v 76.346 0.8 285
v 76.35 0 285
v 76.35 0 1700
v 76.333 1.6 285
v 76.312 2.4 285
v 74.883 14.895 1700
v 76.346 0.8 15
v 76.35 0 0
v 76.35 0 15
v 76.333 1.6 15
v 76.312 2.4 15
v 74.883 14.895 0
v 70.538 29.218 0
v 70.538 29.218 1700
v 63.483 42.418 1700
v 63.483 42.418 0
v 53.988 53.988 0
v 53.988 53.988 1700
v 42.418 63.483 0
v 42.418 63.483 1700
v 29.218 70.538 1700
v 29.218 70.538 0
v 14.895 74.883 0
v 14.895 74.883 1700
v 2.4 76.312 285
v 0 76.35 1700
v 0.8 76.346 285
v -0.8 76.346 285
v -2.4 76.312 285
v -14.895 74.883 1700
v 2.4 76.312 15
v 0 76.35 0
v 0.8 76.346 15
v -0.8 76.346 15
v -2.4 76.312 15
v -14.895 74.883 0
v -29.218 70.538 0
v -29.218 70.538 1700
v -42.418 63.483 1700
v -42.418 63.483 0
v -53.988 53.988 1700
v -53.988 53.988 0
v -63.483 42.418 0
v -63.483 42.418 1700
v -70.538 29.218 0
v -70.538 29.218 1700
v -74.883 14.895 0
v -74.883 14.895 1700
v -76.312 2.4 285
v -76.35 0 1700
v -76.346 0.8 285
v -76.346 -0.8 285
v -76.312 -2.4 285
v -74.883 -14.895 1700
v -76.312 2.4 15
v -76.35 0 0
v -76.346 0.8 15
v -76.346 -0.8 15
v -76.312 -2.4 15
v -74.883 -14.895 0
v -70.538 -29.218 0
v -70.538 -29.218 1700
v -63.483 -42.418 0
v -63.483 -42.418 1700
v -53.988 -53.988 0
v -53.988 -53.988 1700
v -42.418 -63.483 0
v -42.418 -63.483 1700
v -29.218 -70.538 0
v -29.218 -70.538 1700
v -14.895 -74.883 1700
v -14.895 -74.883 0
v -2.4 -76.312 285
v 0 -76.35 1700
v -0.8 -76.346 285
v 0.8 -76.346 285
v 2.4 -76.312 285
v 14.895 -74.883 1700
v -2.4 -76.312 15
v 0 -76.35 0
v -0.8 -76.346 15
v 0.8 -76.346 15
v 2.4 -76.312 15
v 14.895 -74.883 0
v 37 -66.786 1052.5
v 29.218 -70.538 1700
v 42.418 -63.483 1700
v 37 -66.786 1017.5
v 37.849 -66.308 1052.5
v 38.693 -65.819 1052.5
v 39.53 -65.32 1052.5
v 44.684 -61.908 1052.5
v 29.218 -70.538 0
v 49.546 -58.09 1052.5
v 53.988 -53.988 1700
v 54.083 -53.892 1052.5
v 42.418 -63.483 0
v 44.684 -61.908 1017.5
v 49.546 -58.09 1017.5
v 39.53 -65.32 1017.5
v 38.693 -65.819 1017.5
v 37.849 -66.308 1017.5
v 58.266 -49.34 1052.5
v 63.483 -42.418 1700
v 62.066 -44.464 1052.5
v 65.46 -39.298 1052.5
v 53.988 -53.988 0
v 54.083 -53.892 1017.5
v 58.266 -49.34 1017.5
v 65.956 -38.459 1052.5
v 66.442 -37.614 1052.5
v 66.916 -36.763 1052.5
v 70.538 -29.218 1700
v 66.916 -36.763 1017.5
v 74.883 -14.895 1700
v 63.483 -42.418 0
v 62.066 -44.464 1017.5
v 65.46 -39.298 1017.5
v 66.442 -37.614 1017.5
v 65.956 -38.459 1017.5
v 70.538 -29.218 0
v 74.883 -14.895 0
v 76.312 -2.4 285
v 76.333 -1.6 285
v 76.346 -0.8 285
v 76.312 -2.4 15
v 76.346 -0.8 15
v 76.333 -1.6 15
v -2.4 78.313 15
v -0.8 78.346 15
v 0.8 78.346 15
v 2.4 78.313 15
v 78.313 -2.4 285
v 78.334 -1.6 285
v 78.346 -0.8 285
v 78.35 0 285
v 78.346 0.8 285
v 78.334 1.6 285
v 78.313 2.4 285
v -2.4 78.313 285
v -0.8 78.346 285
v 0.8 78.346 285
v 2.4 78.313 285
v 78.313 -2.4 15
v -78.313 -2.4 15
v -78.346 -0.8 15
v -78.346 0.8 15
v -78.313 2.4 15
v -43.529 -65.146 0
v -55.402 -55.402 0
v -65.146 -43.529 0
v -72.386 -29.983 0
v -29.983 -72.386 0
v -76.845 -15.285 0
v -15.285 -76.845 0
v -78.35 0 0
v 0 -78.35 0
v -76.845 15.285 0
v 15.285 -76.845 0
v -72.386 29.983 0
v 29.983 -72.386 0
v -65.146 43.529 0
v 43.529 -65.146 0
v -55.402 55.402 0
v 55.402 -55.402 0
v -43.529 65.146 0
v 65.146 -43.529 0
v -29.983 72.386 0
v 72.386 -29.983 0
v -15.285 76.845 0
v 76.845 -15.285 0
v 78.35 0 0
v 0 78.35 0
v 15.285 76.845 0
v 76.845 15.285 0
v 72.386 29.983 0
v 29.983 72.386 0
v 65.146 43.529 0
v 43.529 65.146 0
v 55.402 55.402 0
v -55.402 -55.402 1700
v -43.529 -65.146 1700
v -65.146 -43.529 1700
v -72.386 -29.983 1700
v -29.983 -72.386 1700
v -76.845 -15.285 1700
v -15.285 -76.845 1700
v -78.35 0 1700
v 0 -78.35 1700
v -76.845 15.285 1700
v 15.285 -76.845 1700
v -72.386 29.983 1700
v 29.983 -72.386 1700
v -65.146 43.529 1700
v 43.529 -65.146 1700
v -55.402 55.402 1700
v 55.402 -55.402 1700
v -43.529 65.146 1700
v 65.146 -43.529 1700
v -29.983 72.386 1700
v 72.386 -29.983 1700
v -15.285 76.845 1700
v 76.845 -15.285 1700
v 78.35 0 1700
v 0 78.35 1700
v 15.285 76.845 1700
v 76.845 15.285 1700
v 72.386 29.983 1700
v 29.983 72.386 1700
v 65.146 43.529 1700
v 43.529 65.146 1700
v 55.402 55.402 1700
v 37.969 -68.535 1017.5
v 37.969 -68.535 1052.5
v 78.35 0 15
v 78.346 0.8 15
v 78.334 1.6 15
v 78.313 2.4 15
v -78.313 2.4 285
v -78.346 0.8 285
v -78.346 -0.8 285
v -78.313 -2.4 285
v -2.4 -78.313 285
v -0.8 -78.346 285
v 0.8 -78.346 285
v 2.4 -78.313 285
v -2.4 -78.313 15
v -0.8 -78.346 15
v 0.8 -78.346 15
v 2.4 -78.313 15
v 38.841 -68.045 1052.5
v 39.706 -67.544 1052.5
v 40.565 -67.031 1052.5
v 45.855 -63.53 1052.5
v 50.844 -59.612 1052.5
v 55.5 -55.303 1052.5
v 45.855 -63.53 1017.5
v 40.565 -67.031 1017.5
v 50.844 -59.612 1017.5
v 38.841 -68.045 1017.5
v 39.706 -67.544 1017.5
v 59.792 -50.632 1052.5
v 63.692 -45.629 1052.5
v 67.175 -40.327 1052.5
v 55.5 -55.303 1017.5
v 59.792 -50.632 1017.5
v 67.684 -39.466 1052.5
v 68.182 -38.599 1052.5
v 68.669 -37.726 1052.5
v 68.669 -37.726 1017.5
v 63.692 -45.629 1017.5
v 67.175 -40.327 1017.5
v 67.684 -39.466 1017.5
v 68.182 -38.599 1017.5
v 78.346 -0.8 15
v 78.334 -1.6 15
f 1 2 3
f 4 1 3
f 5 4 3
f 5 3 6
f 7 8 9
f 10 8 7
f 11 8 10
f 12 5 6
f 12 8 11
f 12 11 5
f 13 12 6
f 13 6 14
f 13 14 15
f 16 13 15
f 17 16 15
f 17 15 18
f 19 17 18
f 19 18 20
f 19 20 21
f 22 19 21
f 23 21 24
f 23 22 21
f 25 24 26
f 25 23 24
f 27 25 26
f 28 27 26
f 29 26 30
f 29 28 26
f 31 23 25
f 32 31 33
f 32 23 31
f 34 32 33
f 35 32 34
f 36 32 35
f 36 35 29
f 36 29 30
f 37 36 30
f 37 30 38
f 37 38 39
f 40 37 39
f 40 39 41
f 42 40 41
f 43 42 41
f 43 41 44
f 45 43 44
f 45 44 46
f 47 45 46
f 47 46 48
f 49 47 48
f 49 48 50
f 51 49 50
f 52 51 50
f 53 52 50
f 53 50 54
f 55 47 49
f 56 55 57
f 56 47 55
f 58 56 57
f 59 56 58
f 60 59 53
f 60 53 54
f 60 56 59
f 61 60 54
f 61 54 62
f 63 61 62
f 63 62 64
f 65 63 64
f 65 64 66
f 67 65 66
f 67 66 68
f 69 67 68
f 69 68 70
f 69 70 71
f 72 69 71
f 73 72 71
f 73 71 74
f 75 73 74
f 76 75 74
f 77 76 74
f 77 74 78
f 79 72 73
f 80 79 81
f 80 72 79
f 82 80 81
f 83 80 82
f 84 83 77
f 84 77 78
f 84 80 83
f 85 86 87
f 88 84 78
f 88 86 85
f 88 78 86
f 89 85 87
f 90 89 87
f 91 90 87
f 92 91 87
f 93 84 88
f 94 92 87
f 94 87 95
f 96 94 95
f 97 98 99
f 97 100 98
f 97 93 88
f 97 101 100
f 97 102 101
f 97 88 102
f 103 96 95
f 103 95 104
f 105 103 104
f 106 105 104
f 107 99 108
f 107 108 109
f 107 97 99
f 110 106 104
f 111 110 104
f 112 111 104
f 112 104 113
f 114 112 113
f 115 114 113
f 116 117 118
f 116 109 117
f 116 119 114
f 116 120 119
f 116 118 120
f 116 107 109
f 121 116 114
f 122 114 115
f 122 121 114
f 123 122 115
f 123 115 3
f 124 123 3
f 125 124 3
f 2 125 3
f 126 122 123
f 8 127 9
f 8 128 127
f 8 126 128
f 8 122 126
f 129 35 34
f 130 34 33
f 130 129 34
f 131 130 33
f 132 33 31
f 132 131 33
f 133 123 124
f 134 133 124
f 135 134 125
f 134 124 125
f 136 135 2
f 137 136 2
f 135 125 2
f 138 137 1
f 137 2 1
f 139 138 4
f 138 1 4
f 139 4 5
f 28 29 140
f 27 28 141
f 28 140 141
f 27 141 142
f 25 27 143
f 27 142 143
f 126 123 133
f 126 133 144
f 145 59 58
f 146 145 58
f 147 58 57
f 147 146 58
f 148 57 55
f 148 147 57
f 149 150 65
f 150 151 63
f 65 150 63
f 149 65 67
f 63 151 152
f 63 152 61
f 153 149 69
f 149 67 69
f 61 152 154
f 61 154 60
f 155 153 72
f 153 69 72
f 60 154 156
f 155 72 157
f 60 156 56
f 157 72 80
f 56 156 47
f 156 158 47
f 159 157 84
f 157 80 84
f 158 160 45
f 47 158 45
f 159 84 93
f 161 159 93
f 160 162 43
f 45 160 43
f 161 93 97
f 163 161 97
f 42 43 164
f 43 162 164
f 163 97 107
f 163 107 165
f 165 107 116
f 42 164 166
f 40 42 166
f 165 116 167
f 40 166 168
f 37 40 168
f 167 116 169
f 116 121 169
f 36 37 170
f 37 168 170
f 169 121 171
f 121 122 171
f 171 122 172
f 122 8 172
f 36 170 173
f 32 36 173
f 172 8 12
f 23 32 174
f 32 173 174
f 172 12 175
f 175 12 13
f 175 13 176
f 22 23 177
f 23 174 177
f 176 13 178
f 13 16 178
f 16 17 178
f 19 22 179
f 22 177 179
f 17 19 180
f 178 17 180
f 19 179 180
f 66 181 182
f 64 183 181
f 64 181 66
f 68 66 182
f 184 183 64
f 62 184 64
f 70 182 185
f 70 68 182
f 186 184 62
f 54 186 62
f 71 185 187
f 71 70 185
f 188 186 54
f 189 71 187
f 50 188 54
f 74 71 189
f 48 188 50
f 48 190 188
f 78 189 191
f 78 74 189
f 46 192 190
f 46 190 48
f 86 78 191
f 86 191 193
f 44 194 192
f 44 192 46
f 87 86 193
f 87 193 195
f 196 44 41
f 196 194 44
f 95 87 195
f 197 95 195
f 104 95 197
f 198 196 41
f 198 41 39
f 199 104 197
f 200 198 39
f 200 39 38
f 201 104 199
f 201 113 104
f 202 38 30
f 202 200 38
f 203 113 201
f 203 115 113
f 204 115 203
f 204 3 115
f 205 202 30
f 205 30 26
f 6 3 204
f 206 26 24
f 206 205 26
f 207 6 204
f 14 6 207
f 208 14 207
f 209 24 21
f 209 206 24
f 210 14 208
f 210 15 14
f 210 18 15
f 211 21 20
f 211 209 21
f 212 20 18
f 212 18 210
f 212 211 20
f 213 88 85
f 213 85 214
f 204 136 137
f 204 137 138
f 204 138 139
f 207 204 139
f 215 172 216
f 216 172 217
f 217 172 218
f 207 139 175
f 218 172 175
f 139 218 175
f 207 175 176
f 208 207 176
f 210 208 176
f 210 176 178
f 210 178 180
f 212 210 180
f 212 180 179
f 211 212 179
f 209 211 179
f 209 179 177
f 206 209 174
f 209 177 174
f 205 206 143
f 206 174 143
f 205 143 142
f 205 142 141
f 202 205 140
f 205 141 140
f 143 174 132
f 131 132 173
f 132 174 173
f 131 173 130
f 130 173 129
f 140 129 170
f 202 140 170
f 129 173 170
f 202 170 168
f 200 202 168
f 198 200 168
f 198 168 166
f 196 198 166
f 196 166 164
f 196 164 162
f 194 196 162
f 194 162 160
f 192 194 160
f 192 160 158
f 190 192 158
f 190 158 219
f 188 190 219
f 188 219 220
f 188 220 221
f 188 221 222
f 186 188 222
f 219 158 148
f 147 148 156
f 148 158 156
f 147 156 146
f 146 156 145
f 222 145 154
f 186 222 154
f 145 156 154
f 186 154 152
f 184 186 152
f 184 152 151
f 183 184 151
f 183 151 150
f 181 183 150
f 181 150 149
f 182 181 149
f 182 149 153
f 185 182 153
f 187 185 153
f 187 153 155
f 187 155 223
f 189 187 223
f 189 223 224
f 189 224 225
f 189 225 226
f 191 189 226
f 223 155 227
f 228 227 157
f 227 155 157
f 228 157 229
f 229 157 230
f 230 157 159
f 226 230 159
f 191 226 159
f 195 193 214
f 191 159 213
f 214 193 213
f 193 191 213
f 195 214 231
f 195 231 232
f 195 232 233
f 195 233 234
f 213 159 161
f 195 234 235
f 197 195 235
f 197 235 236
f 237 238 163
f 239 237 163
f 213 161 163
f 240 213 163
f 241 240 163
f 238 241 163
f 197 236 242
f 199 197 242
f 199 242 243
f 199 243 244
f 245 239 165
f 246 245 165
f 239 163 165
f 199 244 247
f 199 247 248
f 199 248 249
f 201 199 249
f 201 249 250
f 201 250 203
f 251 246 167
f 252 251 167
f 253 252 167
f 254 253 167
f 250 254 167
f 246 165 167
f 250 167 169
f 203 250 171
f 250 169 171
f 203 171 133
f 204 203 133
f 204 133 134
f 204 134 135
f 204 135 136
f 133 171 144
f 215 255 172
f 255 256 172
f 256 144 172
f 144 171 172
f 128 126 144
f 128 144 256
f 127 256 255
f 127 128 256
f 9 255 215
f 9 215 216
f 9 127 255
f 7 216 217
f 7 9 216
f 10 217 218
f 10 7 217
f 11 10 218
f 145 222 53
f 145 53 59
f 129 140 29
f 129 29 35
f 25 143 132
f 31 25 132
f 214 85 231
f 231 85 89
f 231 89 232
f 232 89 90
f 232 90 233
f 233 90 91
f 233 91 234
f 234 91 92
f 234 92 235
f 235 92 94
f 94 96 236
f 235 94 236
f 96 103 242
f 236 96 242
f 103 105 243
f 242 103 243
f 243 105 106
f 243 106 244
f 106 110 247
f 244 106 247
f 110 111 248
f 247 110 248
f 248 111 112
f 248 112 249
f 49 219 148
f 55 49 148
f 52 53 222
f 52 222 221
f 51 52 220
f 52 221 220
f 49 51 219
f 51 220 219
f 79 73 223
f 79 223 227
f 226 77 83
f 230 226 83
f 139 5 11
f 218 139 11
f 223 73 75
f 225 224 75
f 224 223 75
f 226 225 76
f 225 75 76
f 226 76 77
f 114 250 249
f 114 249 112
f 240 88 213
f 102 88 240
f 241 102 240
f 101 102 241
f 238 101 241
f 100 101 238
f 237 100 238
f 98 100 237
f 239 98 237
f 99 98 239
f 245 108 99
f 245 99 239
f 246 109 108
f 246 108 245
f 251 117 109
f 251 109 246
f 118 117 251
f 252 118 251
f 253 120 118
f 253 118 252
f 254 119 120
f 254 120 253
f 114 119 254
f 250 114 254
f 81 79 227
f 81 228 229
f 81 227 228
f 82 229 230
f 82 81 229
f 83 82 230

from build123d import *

# Parameters (mm, degrees)
SKETCH1_R               = 78.35
SKETCH1_R_2             = 76.35
BOSS_EXTRUDE1_DEPTH     = 1700
SKETCH5_R               = 15
CUT_EXTRUDE2_DEPTH      = 1704.607186237
SKETCH6_W               = 4.8
SKETCH6_H               = 270
CUT_EXTRUDE3_DEPTH      = 1704.607186346
CIRPATTERN1_COUNT       = 2
CIRPATTERN1_ANGLE       = 90
CUT_EXTRUDE4_DEPTH      = 17.5
CUT_EXTRUDE4_DEPTH_BACK = 17.5


with BuildPart() as part:
    # Sketch1 → Boss-Extrude1 (new body)
    with BuildSketch(Plane.XY):
        Circle(SKETCH1_R)
        Circle(SKETCH1_R_2, mode=Mode.SUBTRACT)
    extrude(amount=BOSS_EXTRUDE1_DEPTH)

    # Sketch5 → Cut-Extrude2 (cut, through all)
    with BuildSketch(Plane(origin=(0, 0, 0), x_dir=(0, 0, -1), z_dir=(0.7071067811865489, -0.7071067811865462, 0))):
        with Locations(Location((-1034.89, 0, 0), (0, 0, 270))):
            Circle(SKETCH5_R)
    extrude(amount=CUT_EXTRUDE2_DEPTH, mode=Mode.SUBTRACT)

    # Sketch6 → Cut-Extrude3 (cut, symmetric)
    with BuildSketch(Plane(origin=(0, 0, 0), x_dir=(1, 0, 0), z_dir=(0, 1, 0))):
        with Locations((0, -150)):
            Rectangle(SKETCH6_W, SKETCH6_H)
    cut_extrude3 = extrude(amount=CUT_EXTRUDE3_DEPTH, both=True, mode=Mode.SUBTRACT)

    # CirPattern1: Cut-Extrude3 ×2 about axis
    cirpattern1_axis = Axis((0, 0, 0), (0, 0, 1))
    for i in range(1, CIRPATTERN1_COUNT):
        add(cut_extrude3.rotate(cirpattern1_axis, i * CIRPATTERN1_ANGLE / (CIRPATTERN1_COUNT - 1)), mode=Mode.SUBTRACT)

    # Sketch7 → Cut-Extrude4 (cut, two sides: drawn at the far end of the back side and taken through both)
    with BuildSketch(Plane.XY.offset(1035).offset(-CUT_EXTRUDE4_DEPTH_BACK)):
        with BuildLine():
            Line((65.460051126, -39.297636146), (67.174787239, -40.327043772))
            ThreePointArc((67.174787239, -40.327043772), (67.934531185, -39.03360056), (68.669373093, -37.725849215))
            Line((68.669373093, -37.725849215), (66.916485458, -36.762840939))
            ThreePointArc((66.916485458, -36.762840939), (66.20040148, -38.03720999), (65.460051126, -39.297636146))
        make_face()
        with BuildLine():
            Line((37, -66.785645913), (37.969220694, -68.535106186))
            ThreePointArc((37.969220694, -68.535106186), (39.274356912, -67.795629573), (40.565096747, -67.031301837))
            Line((40.565096747, -67.031301837), (39.529612465, -65.320228401))
            ThreePointArc((39.529612465, -65.320228401), (38.271820679, -66.065045538), (37, -66.785645913))
        make_face()
        with BuildLine():
            Line((39.529612465, -65.320228401), (40.565096747, -67.031301837))
            ThreePointArc((40.565096747, -67.031301837), (48.389164921, -61.621515871), (55.5, -55.303458301))
            Line((55.5, -55.303458301), (54.083280153, -53.891755472))
            ThreePointArc((54.083280153, -53.891755472), (47.15395969, -60.048535249), (39.529612465, -65.320228401))
        make_face()
        with BuildLine():
            Line((54.083280153, -53.891755472), (55.5, -55.303458301))
            ThreePointArc((55.5, -55.303458301), (61.792791684, -48.170254265), (67.174787239, -40.327043772))
            Line((67.174787239, -40.327043772), (65.460051126, -39.297636146))
            ThreePointArc((65.460051126, -39.297636146), (60.215438992, -46.940637053), (54.083280153, -53.891755472))
        make_face()
    extrude(amount=CUT_EXTRUDE4_DEPTH + CUT_EXTRUDE4_DEPTH_BACK, mode=Mode.SUBTRACT)


solid = part.part
